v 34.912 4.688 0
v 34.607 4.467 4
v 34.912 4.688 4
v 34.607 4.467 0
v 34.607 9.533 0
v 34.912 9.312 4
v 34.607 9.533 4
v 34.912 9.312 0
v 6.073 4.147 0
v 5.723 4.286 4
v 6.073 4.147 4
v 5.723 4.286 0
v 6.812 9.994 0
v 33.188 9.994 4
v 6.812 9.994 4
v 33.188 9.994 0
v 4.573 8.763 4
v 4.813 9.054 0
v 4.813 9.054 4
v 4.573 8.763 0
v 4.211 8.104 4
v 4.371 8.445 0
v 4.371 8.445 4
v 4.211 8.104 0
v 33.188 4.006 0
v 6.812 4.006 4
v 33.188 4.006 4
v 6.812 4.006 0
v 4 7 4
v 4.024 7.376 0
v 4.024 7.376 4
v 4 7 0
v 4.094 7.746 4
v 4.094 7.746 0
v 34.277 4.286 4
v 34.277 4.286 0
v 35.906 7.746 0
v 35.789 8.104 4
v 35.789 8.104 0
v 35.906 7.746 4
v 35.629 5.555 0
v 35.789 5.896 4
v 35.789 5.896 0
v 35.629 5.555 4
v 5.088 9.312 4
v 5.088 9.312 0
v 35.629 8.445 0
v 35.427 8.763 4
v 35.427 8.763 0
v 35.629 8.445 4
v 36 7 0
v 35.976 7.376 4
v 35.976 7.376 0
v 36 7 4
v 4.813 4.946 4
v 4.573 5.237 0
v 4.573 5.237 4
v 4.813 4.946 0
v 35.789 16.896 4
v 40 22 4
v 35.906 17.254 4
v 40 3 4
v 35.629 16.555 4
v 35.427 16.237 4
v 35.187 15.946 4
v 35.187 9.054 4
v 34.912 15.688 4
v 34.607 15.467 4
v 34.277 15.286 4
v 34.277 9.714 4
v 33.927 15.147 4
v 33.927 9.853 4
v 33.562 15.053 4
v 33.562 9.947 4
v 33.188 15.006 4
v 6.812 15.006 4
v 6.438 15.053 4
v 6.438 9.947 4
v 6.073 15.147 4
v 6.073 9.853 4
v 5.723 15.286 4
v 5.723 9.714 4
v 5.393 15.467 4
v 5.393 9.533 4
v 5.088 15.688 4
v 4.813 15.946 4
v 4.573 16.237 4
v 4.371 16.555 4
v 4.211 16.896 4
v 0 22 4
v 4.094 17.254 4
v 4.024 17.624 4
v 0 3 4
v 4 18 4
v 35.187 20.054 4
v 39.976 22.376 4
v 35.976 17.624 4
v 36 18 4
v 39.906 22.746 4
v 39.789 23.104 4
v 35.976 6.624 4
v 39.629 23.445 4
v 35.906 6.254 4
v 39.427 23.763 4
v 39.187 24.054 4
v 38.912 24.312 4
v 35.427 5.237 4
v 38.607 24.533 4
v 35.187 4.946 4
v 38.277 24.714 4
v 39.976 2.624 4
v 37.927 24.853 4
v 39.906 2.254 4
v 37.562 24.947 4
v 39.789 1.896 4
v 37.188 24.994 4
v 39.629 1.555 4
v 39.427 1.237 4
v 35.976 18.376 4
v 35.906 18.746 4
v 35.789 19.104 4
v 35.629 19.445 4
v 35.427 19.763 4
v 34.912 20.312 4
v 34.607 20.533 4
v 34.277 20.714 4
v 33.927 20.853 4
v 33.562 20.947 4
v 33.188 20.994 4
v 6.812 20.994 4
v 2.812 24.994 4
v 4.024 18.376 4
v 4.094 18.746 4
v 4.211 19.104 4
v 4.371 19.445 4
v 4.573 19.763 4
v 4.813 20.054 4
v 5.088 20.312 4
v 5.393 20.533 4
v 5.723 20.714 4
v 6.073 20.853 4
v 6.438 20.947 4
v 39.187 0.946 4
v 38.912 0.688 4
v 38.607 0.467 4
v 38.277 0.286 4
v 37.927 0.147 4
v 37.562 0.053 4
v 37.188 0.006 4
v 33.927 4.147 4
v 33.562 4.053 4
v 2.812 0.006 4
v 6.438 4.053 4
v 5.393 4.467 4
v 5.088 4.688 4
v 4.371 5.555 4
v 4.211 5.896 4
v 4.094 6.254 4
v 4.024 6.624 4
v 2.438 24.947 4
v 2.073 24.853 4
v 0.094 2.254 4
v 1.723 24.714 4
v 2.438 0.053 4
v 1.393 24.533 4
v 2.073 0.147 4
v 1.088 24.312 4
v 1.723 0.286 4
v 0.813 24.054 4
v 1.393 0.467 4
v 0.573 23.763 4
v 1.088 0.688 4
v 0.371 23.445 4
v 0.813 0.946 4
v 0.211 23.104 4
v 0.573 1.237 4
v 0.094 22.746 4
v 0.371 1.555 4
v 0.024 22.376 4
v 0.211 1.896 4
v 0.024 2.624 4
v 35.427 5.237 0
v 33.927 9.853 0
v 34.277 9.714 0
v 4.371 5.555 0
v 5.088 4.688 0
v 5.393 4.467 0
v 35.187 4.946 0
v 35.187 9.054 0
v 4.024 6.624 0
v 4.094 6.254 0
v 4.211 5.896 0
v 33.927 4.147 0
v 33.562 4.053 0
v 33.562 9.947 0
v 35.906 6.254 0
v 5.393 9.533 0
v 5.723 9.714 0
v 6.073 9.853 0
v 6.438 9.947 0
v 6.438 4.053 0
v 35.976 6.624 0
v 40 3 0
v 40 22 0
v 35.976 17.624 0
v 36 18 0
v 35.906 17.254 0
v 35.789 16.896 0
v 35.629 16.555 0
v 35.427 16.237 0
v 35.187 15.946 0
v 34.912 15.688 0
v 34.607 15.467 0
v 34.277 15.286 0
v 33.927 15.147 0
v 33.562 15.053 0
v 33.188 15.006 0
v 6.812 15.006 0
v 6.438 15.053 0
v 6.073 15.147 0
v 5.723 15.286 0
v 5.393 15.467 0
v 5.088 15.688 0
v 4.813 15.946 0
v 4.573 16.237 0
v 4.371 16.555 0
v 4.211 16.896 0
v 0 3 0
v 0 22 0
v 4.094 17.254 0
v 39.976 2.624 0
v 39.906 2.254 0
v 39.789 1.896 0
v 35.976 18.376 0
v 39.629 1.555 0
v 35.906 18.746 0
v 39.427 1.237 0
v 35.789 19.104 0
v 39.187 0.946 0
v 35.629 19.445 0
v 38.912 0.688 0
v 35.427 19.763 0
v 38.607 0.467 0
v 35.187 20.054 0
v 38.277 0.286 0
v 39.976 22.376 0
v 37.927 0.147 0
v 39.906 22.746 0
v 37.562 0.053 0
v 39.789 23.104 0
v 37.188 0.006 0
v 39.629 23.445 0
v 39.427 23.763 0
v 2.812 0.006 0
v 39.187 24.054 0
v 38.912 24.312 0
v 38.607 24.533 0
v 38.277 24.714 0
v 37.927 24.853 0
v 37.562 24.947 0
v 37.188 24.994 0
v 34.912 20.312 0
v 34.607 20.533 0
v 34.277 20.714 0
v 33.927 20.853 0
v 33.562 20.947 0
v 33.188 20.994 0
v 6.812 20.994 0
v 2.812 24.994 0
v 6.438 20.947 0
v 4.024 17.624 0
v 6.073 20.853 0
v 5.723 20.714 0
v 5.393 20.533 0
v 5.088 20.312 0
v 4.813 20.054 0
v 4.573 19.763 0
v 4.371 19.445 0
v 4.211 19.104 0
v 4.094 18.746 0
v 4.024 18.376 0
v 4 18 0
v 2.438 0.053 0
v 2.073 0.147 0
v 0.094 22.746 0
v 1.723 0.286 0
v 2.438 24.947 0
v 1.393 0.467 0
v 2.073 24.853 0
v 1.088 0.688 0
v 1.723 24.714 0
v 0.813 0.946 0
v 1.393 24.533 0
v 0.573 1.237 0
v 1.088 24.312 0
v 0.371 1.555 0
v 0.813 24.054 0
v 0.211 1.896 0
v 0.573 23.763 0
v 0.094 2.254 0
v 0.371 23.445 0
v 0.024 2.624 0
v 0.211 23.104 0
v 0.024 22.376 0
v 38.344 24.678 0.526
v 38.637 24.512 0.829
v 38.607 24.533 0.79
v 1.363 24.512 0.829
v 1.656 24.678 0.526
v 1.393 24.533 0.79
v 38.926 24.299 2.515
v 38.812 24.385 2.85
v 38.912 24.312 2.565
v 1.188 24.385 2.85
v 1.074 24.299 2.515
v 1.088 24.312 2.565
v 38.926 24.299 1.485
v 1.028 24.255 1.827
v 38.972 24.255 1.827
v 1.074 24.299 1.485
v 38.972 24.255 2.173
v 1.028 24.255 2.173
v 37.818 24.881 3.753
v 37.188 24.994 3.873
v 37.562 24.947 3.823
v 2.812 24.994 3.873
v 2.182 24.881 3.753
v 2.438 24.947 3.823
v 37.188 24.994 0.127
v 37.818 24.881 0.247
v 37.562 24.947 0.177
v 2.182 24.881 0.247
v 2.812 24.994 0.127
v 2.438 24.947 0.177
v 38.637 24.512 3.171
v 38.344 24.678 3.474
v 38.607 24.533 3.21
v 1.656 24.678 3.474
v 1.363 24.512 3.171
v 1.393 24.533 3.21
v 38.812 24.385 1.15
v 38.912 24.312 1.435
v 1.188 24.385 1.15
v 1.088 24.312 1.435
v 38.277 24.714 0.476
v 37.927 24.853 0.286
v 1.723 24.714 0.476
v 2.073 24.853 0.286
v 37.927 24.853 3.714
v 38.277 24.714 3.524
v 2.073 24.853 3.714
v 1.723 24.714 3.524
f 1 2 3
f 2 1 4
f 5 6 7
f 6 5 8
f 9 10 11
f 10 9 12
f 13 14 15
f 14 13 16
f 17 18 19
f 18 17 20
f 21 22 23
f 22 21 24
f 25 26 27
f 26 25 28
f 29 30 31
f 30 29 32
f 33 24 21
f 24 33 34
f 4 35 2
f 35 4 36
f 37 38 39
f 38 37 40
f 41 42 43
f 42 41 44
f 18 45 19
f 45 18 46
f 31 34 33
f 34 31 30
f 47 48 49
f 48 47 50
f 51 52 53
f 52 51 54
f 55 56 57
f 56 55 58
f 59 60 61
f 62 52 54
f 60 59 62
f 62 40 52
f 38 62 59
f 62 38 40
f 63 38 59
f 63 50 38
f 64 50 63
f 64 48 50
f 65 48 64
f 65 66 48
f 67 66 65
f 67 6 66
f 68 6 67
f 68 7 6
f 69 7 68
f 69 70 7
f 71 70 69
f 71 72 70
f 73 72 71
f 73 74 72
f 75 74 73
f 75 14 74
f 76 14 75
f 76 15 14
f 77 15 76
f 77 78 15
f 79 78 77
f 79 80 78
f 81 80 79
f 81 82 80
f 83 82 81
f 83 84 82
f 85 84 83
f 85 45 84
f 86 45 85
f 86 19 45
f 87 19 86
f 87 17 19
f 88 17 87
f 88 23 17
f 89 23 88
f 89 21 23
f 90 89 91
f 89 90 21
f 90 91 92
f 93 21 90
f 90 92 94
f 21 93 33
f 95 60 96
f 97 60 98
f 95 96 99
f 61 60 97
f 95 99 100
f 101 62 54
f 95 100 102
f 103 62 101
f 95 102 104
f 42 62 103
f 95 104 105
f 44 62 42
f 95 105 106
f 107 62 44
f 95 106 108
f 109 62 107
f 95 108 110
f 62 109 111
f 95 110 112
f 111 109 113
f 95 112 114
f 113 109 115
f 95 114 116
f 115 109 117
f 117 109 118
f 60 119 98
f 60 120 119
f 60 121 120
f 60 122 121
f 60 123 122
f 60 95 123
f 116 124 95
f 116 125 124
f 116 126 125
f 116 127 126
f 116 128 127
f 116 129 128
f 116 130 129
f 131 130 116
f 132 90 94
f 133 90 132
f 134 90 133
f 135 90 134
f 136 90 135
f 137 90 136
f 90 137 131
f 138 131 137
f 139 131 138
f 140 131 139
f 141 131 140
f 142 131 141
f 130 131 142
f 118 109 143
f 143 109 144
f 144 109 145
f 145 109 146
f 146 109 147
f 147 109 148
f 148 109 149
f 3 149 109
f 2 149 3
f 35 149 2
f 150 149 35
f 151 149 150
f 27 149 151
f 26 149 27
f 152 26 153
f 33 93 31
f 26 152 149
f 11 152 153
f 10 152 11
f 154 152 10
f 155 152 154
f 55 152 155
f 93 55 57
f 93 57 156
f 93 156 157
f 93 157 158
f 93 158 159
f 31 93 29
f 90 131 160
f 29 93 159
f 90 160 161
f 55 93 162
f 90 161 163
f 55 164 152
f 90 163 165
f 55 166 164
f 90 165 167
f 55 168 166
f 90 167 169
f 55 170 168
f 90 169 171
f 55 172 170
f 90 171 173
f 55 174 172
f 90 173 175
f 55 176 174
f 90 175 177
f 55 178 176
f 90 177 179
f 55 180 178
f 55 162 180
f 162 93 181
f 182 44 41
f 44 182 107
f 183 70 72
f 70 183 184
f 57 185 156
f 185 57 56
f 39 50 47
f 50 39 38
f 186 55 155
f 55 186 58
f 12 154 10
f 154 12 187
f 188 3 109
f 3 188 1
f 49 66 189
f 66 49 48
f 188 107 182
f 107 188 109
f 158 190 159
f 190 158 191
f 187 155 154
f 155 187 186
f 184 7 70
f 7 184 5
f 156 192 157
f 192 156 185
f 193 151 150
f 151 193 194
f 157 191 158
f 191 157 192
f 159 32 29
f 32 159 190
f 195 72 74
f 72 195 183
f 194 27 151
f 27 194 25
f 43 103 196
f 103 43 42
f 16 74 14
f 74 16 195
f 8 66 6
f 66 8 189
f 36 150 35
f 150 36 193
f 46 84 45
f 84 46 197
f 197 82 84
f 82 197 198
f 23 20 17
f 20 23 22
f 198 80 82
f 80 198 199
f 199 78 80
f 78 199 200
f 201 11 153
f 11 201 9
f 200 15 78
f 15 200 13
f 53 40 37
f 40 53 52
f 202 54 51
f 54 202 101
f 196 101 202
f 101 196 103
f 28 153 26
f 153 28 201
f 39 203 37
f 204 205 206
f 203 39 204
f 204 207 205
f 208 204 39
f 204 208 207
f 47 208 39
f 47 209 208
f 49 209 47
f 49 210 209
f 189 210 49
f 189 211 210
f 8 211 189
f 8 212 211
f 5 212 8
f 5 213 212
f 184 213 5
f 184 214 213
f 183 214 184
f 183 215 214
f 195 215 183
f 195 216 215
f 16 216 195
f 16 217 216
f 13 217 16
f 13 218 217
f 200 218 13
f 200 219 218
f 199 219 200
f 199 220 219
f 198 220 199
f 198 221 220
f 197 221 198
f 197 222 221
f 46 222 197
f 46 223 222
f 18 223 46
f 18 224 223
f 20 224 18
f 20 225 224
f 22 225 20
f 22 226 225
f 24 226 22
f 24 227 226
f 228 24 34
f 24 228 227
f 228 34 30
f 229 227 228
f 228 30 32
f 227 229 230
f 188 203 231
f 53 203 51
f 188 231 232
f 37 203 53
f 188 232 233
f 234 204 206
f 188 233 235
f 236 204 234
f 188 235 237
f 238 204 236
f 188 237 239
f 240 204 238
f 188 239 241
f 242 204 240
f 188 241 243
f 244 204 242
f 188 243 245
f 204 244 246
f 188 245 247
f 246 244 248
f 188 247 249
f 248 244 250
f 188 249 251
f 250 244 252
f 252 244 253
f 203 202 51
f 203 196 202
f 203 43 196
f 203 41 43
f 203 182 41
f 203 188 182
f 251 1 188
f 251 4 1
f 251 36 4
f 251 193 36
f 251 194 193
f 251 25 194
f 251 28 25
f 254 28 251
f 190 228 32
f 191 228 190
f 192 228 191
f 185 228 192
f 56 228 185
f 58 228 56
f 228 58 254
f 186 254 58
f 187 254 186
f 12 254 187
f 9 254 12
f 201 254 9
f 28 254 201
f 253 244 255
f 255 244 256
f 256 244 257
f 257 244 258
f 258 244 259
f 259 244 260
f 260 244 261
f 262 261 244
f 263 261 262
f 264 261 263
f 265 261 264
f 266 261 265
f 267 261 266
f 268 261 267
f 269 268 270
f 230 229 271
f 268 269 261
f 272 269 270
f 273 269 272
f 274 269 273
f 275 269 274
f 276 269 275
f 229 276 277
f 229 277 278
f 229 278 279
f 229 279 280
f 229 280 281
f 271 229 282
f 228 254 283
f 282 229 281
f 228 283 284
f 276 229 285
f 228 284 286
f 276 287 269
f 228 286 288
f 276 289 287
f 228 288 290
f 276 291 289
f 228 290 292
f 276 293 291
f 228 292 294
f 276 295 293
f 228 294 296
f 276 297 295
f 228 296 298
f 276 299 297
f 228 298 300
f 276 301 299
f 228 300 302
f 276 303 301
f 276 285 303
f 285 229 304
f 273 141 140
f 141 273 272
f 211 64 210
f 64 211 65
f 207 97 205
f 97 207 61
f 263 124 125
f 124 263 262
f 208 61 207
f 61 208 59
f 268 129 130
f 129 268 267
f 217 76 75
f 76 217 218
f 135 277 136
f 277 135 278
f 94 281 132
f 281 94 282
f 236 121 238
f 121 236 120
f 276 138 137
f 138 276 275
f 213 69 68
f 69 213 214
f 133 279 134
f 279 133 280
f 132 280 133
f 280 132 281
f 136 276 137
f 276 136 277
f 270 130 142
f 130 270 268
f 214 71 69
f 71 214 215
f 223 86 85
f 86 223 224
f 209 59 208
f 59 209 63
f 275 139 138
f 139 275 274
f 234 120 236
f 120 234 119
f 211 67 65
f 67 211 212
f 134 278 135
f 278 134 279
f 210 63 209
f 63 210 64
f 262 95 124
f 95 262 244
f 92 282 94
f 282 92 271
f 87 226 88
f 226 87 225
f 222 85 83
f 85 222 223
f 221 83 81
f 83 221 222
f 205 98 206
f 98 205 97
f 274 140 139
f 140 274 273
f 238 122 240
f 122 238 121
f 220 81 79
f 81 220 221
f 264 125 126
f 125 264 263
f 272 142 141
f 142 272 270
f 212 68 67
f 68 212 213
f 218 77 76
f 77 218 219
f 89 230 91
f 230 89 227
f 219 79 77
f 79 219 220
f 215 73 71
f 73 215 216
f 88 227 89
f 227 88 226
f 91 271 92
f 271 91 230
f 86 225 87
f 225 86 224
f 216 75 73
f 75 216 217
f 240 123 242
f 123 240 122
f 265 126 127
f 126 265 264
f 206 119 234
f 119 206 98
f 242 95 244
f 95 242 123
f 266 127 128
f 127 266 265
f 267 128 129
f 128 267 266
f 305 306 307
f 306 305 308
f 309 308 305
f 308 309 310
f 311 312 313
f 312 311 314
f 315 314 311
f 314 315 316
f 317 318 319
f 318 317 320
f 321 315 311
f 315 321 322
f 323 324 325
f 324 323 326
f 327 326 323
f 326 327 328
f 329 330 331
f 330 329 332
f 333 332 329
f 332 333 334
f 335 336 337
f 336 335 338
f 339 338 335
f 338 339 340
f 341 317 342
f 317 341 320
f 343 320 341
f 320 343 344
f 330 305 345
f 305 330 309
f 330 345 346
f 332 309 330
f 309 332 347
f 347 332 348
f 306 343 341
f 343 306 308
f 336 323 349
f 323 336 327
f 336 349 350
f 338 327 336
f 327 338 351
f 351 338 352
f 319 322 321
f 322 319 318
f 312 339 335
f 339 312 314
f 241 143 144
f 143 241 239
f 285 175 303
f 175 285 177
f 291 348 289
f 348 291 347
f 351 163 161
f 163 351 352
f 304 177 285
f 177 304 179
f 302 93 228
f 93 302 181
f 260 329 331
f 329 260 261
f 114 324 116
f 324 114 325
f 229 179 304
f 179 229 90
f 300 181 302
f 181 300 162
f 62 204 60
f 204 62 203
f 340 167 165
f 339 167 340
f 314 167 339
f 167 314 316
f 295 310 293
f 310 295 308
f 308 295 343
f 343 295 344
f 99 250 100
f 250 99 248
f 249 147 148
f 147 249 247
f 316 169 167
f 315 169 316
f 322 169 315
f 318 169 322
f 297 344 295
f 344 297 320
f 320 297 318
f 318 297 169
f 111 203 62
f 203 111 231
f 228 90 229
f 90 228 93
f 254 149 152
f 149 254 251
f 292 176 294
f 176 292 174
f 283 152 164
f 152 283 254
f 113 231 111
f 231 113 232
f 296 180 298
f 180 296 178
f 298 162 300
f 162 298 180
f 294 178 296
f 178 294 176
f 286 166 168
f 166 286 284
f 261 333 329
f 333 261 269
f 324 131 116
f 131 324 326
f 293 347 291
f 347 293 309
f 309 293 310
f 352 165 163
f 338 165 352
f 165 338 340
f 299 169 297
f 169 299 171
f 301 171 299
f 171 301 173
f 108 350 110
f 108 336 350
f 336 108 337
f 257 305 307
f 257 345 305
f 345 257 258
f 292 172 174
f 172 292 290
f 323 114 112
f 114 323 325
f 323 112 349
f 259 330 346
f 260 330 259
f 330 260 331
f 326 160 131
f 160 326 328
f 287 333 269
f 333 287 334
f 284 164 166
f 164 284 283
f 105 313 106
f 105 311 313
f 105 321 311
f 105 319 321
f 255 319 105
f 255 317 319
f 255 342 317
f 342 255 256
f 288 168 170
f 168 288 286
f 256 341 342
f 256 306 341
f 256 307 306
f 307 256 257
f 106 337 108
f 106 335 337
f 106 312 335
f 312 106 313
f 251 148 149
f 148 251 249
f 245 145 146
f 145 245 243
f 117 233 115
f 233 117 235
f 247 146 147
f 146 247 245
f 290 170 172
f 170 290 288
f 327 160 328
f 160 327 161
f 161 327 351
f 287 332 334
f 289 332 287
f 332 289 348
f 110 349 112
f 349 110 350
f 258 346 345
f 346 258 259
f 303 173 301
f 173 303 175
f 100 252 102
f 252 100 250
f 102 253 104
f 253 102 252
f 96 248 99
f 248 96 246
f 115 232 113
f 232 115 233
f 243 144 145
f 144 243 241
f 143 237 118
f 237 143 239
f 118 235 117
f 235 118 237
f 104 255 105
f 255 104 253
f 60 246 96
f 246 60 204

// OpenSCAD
// 40 x 25
// space 28-29 mm
// holes 5-6 mm
X = 40;
Y = 25;
Z = 4;

$fn=50;
D = 6;

difference() {
    
hull(){
    translate([D/2,D/2,0]) cylinder(d=D, h=Z);
    translate([X-D/2,D/2,0]) cylinder(d=D, h=Z);
    translate([D/2,Y-D/2,0]) cylinder(d=D, h=Z);
    translate([X-D/2,Y-D/2,0]) cylinder(d=D, h=Z);
}

union(){

    hull(){
    translate([D+1,D+1,0]) cylinder(d=D, h=Z);
    translate([X-D-1,D+1,0]) cylinder(d=D, h=Z);
    }


    hull(){
    translate([D+1,Y-D-1,0]) cylinder(d=D, h=Z);
    translate([X-D-1,Y-D-1,0]) cylinder(d=D, h=Z);
    }

    translate([0,Y+2,Z/2]) rotate([0,90,0]) cylinder(d=D-0.5,h=X);

}
}
